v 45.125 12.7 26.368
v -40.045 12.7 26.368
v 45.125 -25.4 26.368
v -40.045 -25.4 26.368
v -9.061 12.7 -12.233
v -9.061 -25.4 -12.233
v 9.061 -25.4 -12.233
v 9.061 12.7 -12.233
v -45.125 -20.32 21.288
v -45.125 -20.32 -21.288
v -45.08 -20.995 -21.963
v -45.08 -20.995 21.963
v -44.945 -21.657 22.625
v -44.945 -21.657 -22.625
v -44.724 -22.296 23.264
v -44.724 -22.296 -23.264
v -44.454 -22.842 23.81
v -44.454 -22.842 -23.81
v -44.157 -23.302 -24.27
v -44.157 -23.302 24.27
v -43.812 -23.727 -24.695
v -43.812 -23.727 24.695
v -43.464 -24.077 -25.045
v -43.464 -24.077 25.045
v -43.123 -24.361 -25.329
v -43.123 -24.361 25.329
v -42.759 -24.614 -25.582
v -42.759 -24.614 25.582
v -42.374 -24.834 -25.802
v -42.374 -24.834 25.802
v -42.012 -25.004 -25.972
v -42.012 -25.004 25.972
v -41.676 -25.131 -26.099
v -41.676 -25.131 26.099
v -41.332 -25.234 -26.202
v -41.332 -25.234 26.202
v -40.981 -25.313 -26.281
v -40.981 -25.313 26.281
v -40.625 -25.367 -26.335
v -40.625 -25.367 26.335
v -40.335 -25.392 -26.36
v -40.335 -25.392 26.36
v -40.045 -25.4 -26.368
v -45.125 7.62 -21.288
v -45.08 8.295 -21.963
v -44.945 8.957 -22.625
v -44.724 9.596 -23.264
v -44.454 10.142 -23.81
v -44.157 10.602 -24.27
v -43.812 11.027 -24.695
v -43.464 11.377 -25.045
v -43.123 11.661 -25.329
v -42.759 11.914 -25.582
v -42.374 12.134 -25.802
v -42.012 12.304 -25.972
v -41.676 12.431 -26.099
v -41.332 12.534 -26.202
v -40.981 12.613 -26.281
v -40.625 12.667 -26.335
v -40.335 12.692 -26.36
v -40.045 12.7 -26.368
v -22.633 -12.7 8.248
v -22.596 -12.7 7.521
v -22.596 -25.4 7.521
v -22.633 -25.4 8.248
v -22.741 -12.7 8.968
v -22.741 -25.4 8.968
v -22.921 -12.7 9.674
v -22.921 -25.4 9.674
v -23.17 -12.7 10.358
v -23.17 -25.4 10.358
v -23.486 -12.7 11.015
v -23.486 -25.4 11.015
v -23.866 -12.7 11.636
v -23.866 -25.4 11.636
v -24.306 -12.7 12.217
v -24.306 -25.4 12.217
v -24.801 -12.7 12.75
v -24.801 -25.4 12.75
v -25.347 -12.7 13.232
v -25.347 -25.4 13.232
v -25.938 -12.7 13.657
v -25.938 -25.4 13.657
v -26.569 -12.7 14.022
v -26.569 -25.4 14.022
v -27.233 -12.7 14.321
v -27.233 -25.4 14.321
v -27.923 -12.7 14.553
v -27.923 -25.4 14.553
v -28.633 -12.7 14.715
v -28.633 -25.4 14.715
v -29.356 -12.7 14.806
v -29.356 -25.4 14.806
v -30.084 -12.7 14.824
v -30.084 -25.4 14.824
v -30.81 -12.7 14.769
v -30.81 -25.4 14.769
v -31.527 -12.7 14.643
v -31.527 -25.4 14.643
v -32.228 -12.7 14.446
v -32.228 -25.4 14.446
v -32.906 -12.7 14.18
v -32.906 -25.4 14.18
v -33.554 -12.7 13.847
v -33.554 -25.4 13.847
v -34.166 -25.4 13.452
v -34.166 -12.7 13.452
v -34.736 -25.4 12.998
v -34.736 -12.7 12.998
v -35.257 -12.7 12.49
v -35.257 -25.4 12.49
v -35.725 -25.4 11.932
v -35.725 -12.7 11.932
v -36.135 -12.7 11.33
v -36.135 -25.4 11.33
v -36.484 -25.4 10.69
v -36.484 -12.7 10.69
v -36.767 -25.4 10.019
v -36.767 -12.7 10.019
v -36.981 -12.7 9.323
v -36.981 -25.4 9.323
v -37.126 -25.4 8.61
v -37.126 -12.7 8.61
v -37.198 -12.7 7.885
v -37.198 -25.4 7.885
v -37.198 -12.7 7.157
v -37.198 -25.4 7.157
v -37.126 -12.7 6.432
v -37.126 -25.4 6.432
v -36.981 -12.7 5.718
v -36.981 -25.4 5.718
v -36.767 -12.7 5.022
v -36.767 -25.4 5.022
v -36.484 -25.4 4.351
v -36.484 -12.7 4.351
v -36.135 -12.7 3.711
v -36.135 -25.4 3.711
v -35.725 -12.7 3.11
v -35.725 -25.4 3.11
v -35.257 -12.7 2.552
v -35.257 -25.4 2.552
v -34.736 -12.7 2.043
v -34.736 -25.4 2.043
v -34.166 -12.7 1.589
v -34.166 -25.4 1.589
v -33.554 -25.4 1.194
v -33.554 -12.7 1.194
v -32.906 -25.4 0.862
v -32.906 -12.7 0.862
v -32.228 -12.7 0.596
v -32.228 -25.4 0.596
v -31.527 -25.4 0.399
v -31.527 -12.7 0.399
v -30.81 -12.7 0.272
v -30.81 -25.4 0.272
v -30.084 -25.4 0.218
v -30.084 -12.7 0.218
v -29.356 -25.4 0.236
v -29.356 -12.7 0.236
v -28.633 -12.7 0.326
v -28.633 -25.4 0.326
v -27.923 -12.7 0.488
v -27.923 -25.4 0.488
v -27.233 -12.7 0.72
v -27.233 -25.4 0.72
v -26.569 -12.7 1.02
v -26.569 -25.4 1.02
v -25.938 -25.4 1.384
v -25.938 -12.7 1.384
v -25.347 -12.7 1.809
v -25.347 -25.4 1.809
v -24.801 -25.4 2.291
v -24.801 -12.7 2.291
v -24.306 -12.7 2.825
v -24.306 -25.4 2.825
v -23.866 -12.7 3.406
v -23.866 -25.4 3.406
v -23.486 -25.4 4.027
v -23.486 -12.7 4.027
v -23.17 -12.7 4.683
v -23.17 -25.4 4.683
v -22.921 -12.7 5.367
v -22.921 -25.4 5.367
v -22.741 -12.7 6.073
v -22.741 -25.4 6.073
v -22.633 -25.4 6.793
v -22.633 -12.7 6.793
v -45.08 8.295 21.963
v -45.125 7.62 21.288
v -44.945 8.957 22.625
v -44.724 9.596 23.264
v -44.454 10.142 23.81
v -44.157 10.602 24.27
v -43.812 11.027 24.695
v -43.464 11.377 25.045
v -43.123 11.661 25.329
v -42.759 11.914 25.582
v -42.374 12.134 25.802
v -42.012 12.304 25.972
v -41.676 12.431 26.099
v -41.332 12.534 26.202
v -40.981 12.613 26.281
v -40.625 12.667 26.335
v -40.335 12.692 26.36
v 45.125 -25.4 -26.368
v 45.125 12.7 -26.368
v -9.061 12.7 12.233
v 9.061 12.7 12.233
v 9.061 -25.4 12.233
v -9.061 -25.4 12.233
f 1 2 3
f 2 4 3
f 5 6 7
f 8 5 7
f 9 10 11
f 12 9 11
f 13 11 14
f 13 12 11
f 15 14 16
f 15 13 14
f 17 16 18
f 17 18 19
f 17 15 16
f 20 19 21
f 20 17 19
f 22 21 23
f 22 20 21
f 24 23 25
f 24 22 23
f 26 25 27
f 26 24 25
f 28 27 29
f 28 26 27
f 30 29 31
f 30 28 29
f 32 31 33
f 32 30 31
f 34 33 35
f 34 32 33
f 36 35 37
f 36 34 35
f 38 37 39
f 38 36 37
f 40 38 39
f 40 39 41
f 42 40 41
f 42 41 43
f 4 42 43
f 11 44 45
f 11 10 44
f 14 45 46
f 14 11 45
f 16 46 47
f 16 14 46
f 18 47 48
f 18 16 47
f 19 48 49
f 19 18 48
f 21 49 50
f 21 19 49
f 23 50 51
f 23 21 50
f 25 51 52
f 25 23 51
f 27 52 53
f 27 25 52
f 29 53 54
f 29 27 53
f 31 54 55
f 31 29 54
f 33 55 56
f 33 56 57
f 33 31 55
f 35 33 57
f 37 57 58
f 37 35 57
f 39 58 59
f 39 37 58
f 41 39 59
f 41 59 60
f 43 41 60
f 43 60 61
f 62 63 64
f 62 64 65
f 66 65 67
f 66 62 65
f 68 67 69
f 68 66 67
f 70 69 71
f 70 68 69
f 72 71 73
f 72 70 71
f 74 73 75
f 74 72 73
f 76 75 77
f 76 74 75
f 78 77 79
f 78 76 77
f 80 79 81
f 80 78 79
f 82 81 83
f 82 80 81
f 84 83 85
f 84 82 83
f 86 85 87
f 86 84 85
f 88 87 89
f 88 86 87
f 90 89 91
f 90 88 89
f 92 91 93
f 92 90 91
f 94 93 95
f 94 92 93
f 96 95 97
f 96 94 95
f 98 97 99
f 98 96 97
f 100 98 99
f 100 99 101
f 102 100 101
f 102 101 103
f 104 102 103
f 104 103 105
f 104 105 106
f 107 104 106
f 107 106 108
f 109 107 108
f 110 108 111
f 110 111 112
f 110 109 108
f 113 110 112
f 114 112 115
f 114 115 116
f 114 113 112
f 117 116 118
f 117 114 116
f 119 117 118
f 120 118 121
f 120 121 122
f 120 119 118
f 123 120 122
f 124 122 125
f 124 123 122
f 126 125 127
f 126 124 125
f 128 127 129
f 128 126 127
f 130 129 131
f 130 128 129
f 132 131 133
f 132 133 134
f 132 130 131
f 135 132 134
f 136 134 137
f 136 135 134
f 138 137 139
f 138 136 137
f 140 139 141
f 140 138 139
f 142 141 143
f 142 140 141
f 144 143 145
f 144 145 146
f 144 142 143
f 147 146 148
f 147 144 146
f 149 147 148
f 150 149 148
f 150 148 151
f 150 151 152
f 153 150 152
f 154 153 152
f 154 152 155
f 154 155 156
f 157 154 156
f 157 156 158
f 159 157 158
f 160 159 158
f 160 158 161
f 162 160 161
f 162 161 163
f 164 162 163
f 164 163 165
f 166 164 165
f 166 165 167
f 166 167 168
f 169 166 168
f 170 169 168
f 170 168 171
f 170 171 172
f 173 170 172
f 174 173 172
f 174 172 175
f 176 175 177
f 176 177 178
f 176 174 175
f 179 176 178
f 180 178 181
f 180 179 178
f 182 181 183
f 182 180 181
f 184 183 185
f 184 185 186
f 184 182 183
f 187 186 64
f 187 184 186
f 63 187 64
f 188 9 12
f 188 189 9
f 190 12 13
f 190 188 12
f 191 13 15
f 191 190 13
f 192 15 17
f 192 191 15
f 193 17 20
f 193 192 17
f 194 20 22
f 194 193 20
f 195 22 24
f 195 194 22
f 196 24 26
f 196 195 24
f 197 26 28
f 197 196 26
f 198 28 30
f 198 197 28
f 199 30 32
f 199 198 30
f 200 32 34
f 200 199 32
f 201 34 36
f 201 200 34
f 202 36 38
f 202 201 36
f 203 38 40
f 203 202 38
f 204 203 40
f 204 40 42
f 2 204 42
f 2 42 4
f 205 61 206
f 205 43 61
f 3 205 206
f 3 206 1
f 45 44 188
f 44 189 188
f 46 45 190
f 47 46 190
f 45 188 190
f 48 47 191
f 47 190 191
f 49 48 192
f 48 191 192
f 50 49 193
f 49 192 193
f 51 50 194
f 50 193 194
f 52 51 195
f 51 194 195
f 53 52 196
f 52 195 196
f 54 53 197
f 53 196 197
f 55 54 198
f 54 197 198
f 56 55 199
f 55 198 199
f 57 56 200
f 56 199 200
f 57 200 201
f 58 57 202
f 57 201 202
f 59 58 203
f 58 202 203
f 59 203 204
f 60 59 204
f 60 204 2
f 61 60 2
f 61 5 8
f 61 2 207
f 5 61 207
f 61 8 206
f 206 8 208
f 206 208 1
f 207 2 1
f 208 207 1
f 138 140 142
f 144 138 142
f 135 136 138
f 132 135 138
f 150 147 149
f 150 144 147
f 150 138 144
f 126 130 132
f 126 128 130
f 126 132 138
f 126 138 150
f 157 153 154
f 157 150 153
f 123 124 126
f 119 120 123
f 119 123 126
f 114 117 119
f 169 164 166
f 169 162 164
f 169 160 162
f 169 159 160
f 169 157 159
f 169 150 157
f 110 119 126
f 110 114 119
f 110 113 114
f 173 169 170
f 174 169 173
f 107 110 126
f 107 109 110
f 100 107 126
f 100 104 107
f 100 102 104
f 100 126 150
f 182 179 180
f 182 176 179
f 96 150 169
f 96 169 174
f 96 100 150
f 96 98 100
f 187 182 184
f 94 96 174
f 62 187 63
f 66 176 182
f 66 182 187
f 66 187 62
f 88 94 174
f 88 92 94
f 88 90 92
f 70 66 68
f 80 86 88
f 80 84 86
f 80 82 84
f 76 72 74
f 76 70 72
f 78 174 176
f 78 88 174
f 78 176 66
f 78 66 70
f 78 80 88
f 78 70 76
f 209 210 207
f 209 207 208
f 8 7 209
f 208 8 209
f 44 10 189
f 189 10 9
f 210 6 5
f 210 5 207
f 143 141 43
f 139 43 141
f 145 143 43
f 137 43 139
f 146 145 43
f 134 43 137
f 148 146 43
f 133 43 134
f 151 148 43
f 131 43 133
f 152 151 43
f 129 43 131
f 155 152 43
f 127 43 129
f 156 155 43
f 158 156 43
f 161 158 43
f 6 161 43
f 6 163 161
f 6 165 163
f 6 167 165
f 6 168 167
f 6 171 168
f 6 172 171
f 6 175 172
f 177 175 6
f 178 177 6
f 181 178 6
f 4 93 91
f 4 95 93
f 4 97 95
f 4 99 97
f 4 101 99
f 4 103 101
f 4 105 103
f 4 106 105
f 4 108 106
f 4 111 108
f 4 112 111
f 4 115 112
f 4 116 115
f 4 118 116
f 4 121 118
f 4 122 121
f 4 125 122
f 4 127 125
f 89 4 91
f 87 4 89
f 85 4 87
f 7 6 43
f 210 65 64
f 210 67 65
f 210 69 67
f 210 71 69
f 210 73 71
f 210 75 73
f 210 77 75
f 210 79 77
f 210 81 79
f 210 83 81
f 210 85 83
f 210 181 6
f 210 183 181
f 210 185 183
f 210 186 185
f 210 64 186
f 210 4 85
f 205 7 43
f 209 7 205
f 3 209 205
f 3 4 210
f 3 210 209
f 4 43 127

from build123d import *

# Parameters (mm, degrees)
F0_W     = 90.249106
F0_H     = 52.73592
F0_W_2   = 18.122312
F0_H_2   = 24.46512
F1_DEPTH = 12.7
F2_W     = 90.249106
F2_H     = 52.73592
F2_R     = 7.305338
F2_W_2   = 18.122312
F2_H_2   = 24.46512
F3_DEPTH = 12.7
F4_R     = 5.08


with BuildPart() as f1:
    # F0 (on Front) → F1 (new body, symmetric)
    with BuildSketch(Plane.XZ):
        Rectangle(F0_W, F0_H)
        Rectangle(F0_W_2, F0_H_2, mode=Mode.SUBTRACT)
    extrude(amount=F1_DEPTH, both=True)

    # F2 (on face) → F3 (join, symmetric)
    with BuildSketch(Plane.XZ.offset(12.7)):
        Rectangle(F2_W, F2_H)
        with Locations((-29.901814, 7.520759)):
            Circle(F2_R, mode=Mode.SUBTRACT)
        Rectangle(F2_W_2, F2_H_2, mode=Mode.SUBTRACT)
    extrude(amount=F3_DEPTH, both=True)

    # F4
    f4_edges = [f1.edges().sort_by_distance(p)[0] for p in [
        (-45.124553, -6.35, 26.36796),
        (-45.124553, 12.7, 0),
        (-45.124553, -6.35, -26.36796),
        (-45.124553, -25.4, 0),
    ]]
    fillet(f4_edges, radius=F4_R)


solid = f1.part
